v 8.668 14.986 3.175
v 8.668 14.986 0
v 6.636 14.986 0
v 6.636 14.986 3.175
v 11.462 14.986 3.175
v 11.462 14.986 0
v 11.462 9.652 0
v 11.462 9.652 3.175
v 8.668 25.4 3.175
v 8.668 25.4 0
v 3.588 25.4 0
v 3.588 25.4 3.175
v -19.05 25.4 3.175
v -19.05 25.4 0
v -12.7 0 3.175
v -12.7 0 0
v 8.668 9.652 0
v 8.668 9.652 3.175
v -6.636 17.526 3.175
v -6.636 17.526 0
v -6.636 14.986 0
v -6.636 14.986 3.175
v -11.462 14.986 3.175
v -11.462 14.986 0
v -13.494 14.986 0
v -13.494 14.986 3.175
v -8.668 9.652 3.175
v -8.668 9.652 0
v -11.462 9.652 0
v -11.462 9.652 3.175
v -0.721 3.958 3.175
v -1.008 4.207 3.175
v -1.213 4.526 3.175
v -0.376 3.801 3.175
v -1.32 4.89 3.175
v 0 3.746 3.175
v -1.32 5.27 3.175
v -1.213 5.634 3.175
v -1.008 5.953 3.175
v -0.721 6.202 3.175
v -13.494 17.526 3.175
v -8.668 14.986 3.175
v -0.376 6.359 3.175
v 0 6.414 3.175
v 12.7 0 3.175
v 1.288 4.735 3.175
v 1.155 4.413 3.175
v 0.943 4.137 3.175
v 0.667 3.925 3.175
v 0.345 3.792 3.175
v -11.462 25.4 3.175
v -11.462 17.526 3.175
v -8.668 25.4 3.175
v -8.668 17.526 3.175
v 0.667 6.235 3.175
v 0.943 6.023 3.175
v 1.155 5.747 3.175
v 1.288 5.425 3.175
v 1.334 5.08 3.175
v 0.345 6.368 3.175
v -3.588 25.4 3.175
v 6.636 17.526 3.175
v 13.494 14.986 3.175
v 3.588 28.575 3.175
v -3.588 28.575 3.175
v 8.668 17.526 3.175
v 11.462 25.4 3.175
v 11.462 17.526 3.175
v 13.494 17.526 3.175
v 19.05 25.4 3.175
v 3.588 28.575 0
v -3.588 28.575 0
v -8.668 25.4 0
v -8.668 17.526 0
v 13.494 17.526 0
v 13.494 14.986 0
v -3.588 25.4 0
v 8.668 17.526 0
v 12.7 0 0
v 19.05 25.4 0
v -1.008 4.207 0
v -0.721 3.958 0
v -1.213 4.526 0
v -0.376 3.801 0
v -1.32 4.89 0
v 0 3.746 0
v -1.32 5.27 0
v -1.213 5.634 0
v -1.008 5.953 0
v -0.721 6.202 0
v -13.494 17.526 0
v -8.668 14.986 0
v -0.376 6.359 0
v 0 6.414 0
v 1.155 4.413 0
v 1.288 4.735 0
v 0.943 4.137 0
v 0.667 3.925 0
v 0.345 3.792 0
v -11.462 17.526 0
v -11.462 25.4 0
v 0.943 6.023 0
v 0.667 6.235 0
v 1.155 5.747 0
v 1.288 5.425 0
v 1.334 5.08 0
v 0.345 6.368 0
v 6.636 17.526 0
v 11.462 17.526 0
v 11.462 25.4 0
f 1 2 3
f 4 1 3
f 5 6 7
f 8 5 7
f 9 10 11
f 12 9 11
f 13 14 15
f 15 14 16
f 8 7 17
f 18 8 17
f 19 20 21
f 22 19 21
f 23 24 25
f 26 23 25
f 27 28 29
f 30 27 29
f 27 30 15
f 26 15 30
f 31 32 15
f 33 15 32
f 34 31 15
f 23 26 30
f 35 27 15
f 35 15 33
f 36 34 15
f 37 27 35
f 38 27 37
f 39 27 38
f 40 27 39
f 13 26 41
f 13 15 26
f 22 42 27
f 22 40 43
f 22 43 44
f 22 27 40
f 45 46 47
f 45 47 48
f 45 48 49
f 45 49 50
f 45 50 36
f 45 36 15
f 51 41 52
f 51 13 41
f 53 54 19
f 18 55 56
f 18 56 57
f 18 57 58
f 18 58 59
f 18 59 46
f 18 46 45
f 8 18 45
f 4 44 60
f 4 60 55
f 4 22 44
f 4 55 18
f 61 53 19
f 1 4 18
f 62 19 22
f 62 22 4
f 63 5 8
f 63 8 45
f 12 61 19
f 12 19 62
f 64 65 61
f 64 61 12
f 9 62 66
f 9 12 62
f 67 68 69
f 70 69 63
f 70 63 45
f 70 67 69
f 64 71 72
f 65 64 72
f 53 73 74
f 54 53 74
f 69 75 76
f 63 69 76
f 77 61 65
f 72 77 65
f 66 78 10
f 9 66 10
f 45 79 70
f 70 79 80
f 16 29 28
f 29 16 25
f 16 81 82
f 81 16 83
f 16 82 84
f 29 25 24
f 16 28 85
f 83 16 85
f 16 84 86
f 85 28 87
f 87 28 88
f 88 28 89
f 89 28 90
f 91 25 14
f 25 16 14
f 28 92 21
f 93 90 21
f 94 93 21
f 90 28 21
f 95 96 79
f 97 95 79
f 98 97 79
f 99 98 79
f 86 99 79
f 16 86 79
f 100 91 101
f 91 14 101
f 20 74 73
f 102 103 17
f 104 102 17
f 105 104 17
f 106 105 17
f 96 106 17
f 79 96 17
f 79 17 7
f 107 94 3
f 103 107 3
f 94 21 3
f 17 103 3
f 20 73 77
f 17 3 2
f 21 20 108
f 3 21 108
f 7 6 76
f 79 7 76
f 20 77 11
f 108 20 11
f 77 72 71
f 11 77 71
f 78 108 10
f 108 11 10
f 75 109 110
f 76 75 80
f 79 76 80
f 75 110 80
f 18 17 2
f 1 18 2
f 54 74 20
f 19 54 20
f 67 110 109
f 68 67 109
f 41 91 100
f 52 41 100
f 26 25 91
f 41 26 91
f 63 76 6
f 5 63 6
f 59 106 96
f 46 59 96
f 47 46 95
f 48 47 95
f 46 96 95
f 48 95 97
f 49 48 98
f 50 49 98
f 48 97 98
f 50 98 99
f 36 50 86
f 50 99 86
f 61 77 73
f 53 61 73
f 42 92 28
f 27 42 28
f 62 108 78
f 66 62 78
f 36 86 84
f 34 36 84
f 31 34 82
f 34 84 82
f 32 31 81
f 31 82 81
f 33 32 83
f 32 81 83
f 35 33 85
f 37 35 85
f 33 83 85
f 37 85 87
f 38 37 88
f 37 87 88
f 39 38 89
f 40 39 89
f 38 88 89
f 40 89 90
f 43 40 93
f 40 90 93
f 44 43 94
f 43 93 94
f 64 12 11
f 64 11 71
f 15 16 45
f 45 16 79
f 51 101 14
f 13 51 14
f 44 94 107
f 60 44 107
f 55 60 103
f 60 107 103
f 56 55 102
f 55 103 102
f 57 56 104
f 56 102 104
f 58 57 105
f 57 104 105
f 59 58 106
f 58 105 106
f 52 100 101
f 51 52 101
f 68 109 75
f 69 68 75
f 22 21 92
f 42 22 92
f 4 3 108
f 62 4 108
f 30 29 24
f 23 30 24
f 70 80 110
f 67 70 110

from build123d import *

# Parameters (mm, degrees)
SKETCH1_W           = 3.58775
SKETCH1_H           = 3.175
BOSS_EXTRUDE1_DEPTH = 3.175


with BuildPart() as part:
    # Sketch1 → Boss-Extrude1 (new body)
    with BuildSketch(Plane.XY):
        with BuildLine():
            Line((0, 3.7465), (0, 0))
            Line((0, 0), (12.7, 0))
            Line((12.7, 0), (19.05, 25.4))
            Line((19.05, 25.4), (11.46175, 25.4))
            Line((11.46175, 25.4), (11.46175, 17.526))
            Line((11.46175, 17.526), (13.49375, 17.526))
            Line((13.49375, 17.526), (13.49375, 14.986))
            Line((13.49375, 14.986), (11.46175, 14.986))
            Line((11.46175, 14.986), (11.46175, 9.652))
            Line((11.46175, 9.652), (8.66775, 9.652))
            Line((8.66775, 9.652), (8.66775, 14.986))
            Line((8.66775, 14.986), (6.63575, 14.986))
            Line((6.63575, 14.986), (6.63575, 17.526))
            Line((6.63575, 17.526), (8.66775, 17.526))
            Line((8.66775, 17.526), (8.66775, 25.4))
            Line((8.66775, 25.4), (3.58775, 25.4))
            Line((3.58775, 25.4), (0, 25.4))
            Line((0, 25.4), (0, 6.4135))
            ThreePointArc((0, 6.4135), (0.942926893, 6.022926893), (1.3335, 5.08))
            ThreePointArc((1.3335, 5.08), (0.942926893, 4.137073107), (0, 3.7465))
        make_face()
        with BuildLine():
            Line((-12.7, 0), (0, 0))
            Line((0, 0), (0, 3.7465))
            ThreePointArc((0, 3.7465), (-1.3335, 5.08), (0, 6.4135))
            Line((0, 6.4135), (0, 25.4))
            Line((0, 25.4), (-3.58775, 25.4))
            Line((-3.58775, 25.4), (-8.66775, 25.4))
            Line((-8.66775, 25.4), (-8.66775, 17.526))
            Line((-8.66775, 17.526), (-6.63575, 17.526))
            Line((-6.63575, 17.526), (-6.63575, 14.986))
            Line((-6.63575, 14.986), (-8.66775, 14.986))
            Line((-8.66775, 14.986), (-8.66775, 9.652))
            Line((-8.66775, 9.652), (-10.06475, 9.652))
            Line((-10.06475, 9.652), (-11.46175, 9.652))
            Line((-11.46175, 9.652), (-11.46175, 14.986))
            Line((-11.46175, 14.986), (-13.49375, 14.986))
            Line((-13.49375, 14.986), (-13.49375, 17.526))
            Line((-13.49375, 17.526), (-11.46175, 17.526))
            Line((-11.46175, 17.526), (-11.46175, 25.4))
            Line((-11.46175, 25.4), (-19.05, 25.4))
            Line((-19.05, 25.4), (-12.7, 0))
        make_face()
        with Locations((1.793875, 26.9875)):
            Rectangle(SKETCH1_W, SKETCH1_H)
        with Locations((-1.793875, 26.9875)):
            Rectangle(SKETCH1_W, SKETCH1_H)
    extrude(amount=BOSS_EXTRUDE1_DEPTH)


solid = part.part
